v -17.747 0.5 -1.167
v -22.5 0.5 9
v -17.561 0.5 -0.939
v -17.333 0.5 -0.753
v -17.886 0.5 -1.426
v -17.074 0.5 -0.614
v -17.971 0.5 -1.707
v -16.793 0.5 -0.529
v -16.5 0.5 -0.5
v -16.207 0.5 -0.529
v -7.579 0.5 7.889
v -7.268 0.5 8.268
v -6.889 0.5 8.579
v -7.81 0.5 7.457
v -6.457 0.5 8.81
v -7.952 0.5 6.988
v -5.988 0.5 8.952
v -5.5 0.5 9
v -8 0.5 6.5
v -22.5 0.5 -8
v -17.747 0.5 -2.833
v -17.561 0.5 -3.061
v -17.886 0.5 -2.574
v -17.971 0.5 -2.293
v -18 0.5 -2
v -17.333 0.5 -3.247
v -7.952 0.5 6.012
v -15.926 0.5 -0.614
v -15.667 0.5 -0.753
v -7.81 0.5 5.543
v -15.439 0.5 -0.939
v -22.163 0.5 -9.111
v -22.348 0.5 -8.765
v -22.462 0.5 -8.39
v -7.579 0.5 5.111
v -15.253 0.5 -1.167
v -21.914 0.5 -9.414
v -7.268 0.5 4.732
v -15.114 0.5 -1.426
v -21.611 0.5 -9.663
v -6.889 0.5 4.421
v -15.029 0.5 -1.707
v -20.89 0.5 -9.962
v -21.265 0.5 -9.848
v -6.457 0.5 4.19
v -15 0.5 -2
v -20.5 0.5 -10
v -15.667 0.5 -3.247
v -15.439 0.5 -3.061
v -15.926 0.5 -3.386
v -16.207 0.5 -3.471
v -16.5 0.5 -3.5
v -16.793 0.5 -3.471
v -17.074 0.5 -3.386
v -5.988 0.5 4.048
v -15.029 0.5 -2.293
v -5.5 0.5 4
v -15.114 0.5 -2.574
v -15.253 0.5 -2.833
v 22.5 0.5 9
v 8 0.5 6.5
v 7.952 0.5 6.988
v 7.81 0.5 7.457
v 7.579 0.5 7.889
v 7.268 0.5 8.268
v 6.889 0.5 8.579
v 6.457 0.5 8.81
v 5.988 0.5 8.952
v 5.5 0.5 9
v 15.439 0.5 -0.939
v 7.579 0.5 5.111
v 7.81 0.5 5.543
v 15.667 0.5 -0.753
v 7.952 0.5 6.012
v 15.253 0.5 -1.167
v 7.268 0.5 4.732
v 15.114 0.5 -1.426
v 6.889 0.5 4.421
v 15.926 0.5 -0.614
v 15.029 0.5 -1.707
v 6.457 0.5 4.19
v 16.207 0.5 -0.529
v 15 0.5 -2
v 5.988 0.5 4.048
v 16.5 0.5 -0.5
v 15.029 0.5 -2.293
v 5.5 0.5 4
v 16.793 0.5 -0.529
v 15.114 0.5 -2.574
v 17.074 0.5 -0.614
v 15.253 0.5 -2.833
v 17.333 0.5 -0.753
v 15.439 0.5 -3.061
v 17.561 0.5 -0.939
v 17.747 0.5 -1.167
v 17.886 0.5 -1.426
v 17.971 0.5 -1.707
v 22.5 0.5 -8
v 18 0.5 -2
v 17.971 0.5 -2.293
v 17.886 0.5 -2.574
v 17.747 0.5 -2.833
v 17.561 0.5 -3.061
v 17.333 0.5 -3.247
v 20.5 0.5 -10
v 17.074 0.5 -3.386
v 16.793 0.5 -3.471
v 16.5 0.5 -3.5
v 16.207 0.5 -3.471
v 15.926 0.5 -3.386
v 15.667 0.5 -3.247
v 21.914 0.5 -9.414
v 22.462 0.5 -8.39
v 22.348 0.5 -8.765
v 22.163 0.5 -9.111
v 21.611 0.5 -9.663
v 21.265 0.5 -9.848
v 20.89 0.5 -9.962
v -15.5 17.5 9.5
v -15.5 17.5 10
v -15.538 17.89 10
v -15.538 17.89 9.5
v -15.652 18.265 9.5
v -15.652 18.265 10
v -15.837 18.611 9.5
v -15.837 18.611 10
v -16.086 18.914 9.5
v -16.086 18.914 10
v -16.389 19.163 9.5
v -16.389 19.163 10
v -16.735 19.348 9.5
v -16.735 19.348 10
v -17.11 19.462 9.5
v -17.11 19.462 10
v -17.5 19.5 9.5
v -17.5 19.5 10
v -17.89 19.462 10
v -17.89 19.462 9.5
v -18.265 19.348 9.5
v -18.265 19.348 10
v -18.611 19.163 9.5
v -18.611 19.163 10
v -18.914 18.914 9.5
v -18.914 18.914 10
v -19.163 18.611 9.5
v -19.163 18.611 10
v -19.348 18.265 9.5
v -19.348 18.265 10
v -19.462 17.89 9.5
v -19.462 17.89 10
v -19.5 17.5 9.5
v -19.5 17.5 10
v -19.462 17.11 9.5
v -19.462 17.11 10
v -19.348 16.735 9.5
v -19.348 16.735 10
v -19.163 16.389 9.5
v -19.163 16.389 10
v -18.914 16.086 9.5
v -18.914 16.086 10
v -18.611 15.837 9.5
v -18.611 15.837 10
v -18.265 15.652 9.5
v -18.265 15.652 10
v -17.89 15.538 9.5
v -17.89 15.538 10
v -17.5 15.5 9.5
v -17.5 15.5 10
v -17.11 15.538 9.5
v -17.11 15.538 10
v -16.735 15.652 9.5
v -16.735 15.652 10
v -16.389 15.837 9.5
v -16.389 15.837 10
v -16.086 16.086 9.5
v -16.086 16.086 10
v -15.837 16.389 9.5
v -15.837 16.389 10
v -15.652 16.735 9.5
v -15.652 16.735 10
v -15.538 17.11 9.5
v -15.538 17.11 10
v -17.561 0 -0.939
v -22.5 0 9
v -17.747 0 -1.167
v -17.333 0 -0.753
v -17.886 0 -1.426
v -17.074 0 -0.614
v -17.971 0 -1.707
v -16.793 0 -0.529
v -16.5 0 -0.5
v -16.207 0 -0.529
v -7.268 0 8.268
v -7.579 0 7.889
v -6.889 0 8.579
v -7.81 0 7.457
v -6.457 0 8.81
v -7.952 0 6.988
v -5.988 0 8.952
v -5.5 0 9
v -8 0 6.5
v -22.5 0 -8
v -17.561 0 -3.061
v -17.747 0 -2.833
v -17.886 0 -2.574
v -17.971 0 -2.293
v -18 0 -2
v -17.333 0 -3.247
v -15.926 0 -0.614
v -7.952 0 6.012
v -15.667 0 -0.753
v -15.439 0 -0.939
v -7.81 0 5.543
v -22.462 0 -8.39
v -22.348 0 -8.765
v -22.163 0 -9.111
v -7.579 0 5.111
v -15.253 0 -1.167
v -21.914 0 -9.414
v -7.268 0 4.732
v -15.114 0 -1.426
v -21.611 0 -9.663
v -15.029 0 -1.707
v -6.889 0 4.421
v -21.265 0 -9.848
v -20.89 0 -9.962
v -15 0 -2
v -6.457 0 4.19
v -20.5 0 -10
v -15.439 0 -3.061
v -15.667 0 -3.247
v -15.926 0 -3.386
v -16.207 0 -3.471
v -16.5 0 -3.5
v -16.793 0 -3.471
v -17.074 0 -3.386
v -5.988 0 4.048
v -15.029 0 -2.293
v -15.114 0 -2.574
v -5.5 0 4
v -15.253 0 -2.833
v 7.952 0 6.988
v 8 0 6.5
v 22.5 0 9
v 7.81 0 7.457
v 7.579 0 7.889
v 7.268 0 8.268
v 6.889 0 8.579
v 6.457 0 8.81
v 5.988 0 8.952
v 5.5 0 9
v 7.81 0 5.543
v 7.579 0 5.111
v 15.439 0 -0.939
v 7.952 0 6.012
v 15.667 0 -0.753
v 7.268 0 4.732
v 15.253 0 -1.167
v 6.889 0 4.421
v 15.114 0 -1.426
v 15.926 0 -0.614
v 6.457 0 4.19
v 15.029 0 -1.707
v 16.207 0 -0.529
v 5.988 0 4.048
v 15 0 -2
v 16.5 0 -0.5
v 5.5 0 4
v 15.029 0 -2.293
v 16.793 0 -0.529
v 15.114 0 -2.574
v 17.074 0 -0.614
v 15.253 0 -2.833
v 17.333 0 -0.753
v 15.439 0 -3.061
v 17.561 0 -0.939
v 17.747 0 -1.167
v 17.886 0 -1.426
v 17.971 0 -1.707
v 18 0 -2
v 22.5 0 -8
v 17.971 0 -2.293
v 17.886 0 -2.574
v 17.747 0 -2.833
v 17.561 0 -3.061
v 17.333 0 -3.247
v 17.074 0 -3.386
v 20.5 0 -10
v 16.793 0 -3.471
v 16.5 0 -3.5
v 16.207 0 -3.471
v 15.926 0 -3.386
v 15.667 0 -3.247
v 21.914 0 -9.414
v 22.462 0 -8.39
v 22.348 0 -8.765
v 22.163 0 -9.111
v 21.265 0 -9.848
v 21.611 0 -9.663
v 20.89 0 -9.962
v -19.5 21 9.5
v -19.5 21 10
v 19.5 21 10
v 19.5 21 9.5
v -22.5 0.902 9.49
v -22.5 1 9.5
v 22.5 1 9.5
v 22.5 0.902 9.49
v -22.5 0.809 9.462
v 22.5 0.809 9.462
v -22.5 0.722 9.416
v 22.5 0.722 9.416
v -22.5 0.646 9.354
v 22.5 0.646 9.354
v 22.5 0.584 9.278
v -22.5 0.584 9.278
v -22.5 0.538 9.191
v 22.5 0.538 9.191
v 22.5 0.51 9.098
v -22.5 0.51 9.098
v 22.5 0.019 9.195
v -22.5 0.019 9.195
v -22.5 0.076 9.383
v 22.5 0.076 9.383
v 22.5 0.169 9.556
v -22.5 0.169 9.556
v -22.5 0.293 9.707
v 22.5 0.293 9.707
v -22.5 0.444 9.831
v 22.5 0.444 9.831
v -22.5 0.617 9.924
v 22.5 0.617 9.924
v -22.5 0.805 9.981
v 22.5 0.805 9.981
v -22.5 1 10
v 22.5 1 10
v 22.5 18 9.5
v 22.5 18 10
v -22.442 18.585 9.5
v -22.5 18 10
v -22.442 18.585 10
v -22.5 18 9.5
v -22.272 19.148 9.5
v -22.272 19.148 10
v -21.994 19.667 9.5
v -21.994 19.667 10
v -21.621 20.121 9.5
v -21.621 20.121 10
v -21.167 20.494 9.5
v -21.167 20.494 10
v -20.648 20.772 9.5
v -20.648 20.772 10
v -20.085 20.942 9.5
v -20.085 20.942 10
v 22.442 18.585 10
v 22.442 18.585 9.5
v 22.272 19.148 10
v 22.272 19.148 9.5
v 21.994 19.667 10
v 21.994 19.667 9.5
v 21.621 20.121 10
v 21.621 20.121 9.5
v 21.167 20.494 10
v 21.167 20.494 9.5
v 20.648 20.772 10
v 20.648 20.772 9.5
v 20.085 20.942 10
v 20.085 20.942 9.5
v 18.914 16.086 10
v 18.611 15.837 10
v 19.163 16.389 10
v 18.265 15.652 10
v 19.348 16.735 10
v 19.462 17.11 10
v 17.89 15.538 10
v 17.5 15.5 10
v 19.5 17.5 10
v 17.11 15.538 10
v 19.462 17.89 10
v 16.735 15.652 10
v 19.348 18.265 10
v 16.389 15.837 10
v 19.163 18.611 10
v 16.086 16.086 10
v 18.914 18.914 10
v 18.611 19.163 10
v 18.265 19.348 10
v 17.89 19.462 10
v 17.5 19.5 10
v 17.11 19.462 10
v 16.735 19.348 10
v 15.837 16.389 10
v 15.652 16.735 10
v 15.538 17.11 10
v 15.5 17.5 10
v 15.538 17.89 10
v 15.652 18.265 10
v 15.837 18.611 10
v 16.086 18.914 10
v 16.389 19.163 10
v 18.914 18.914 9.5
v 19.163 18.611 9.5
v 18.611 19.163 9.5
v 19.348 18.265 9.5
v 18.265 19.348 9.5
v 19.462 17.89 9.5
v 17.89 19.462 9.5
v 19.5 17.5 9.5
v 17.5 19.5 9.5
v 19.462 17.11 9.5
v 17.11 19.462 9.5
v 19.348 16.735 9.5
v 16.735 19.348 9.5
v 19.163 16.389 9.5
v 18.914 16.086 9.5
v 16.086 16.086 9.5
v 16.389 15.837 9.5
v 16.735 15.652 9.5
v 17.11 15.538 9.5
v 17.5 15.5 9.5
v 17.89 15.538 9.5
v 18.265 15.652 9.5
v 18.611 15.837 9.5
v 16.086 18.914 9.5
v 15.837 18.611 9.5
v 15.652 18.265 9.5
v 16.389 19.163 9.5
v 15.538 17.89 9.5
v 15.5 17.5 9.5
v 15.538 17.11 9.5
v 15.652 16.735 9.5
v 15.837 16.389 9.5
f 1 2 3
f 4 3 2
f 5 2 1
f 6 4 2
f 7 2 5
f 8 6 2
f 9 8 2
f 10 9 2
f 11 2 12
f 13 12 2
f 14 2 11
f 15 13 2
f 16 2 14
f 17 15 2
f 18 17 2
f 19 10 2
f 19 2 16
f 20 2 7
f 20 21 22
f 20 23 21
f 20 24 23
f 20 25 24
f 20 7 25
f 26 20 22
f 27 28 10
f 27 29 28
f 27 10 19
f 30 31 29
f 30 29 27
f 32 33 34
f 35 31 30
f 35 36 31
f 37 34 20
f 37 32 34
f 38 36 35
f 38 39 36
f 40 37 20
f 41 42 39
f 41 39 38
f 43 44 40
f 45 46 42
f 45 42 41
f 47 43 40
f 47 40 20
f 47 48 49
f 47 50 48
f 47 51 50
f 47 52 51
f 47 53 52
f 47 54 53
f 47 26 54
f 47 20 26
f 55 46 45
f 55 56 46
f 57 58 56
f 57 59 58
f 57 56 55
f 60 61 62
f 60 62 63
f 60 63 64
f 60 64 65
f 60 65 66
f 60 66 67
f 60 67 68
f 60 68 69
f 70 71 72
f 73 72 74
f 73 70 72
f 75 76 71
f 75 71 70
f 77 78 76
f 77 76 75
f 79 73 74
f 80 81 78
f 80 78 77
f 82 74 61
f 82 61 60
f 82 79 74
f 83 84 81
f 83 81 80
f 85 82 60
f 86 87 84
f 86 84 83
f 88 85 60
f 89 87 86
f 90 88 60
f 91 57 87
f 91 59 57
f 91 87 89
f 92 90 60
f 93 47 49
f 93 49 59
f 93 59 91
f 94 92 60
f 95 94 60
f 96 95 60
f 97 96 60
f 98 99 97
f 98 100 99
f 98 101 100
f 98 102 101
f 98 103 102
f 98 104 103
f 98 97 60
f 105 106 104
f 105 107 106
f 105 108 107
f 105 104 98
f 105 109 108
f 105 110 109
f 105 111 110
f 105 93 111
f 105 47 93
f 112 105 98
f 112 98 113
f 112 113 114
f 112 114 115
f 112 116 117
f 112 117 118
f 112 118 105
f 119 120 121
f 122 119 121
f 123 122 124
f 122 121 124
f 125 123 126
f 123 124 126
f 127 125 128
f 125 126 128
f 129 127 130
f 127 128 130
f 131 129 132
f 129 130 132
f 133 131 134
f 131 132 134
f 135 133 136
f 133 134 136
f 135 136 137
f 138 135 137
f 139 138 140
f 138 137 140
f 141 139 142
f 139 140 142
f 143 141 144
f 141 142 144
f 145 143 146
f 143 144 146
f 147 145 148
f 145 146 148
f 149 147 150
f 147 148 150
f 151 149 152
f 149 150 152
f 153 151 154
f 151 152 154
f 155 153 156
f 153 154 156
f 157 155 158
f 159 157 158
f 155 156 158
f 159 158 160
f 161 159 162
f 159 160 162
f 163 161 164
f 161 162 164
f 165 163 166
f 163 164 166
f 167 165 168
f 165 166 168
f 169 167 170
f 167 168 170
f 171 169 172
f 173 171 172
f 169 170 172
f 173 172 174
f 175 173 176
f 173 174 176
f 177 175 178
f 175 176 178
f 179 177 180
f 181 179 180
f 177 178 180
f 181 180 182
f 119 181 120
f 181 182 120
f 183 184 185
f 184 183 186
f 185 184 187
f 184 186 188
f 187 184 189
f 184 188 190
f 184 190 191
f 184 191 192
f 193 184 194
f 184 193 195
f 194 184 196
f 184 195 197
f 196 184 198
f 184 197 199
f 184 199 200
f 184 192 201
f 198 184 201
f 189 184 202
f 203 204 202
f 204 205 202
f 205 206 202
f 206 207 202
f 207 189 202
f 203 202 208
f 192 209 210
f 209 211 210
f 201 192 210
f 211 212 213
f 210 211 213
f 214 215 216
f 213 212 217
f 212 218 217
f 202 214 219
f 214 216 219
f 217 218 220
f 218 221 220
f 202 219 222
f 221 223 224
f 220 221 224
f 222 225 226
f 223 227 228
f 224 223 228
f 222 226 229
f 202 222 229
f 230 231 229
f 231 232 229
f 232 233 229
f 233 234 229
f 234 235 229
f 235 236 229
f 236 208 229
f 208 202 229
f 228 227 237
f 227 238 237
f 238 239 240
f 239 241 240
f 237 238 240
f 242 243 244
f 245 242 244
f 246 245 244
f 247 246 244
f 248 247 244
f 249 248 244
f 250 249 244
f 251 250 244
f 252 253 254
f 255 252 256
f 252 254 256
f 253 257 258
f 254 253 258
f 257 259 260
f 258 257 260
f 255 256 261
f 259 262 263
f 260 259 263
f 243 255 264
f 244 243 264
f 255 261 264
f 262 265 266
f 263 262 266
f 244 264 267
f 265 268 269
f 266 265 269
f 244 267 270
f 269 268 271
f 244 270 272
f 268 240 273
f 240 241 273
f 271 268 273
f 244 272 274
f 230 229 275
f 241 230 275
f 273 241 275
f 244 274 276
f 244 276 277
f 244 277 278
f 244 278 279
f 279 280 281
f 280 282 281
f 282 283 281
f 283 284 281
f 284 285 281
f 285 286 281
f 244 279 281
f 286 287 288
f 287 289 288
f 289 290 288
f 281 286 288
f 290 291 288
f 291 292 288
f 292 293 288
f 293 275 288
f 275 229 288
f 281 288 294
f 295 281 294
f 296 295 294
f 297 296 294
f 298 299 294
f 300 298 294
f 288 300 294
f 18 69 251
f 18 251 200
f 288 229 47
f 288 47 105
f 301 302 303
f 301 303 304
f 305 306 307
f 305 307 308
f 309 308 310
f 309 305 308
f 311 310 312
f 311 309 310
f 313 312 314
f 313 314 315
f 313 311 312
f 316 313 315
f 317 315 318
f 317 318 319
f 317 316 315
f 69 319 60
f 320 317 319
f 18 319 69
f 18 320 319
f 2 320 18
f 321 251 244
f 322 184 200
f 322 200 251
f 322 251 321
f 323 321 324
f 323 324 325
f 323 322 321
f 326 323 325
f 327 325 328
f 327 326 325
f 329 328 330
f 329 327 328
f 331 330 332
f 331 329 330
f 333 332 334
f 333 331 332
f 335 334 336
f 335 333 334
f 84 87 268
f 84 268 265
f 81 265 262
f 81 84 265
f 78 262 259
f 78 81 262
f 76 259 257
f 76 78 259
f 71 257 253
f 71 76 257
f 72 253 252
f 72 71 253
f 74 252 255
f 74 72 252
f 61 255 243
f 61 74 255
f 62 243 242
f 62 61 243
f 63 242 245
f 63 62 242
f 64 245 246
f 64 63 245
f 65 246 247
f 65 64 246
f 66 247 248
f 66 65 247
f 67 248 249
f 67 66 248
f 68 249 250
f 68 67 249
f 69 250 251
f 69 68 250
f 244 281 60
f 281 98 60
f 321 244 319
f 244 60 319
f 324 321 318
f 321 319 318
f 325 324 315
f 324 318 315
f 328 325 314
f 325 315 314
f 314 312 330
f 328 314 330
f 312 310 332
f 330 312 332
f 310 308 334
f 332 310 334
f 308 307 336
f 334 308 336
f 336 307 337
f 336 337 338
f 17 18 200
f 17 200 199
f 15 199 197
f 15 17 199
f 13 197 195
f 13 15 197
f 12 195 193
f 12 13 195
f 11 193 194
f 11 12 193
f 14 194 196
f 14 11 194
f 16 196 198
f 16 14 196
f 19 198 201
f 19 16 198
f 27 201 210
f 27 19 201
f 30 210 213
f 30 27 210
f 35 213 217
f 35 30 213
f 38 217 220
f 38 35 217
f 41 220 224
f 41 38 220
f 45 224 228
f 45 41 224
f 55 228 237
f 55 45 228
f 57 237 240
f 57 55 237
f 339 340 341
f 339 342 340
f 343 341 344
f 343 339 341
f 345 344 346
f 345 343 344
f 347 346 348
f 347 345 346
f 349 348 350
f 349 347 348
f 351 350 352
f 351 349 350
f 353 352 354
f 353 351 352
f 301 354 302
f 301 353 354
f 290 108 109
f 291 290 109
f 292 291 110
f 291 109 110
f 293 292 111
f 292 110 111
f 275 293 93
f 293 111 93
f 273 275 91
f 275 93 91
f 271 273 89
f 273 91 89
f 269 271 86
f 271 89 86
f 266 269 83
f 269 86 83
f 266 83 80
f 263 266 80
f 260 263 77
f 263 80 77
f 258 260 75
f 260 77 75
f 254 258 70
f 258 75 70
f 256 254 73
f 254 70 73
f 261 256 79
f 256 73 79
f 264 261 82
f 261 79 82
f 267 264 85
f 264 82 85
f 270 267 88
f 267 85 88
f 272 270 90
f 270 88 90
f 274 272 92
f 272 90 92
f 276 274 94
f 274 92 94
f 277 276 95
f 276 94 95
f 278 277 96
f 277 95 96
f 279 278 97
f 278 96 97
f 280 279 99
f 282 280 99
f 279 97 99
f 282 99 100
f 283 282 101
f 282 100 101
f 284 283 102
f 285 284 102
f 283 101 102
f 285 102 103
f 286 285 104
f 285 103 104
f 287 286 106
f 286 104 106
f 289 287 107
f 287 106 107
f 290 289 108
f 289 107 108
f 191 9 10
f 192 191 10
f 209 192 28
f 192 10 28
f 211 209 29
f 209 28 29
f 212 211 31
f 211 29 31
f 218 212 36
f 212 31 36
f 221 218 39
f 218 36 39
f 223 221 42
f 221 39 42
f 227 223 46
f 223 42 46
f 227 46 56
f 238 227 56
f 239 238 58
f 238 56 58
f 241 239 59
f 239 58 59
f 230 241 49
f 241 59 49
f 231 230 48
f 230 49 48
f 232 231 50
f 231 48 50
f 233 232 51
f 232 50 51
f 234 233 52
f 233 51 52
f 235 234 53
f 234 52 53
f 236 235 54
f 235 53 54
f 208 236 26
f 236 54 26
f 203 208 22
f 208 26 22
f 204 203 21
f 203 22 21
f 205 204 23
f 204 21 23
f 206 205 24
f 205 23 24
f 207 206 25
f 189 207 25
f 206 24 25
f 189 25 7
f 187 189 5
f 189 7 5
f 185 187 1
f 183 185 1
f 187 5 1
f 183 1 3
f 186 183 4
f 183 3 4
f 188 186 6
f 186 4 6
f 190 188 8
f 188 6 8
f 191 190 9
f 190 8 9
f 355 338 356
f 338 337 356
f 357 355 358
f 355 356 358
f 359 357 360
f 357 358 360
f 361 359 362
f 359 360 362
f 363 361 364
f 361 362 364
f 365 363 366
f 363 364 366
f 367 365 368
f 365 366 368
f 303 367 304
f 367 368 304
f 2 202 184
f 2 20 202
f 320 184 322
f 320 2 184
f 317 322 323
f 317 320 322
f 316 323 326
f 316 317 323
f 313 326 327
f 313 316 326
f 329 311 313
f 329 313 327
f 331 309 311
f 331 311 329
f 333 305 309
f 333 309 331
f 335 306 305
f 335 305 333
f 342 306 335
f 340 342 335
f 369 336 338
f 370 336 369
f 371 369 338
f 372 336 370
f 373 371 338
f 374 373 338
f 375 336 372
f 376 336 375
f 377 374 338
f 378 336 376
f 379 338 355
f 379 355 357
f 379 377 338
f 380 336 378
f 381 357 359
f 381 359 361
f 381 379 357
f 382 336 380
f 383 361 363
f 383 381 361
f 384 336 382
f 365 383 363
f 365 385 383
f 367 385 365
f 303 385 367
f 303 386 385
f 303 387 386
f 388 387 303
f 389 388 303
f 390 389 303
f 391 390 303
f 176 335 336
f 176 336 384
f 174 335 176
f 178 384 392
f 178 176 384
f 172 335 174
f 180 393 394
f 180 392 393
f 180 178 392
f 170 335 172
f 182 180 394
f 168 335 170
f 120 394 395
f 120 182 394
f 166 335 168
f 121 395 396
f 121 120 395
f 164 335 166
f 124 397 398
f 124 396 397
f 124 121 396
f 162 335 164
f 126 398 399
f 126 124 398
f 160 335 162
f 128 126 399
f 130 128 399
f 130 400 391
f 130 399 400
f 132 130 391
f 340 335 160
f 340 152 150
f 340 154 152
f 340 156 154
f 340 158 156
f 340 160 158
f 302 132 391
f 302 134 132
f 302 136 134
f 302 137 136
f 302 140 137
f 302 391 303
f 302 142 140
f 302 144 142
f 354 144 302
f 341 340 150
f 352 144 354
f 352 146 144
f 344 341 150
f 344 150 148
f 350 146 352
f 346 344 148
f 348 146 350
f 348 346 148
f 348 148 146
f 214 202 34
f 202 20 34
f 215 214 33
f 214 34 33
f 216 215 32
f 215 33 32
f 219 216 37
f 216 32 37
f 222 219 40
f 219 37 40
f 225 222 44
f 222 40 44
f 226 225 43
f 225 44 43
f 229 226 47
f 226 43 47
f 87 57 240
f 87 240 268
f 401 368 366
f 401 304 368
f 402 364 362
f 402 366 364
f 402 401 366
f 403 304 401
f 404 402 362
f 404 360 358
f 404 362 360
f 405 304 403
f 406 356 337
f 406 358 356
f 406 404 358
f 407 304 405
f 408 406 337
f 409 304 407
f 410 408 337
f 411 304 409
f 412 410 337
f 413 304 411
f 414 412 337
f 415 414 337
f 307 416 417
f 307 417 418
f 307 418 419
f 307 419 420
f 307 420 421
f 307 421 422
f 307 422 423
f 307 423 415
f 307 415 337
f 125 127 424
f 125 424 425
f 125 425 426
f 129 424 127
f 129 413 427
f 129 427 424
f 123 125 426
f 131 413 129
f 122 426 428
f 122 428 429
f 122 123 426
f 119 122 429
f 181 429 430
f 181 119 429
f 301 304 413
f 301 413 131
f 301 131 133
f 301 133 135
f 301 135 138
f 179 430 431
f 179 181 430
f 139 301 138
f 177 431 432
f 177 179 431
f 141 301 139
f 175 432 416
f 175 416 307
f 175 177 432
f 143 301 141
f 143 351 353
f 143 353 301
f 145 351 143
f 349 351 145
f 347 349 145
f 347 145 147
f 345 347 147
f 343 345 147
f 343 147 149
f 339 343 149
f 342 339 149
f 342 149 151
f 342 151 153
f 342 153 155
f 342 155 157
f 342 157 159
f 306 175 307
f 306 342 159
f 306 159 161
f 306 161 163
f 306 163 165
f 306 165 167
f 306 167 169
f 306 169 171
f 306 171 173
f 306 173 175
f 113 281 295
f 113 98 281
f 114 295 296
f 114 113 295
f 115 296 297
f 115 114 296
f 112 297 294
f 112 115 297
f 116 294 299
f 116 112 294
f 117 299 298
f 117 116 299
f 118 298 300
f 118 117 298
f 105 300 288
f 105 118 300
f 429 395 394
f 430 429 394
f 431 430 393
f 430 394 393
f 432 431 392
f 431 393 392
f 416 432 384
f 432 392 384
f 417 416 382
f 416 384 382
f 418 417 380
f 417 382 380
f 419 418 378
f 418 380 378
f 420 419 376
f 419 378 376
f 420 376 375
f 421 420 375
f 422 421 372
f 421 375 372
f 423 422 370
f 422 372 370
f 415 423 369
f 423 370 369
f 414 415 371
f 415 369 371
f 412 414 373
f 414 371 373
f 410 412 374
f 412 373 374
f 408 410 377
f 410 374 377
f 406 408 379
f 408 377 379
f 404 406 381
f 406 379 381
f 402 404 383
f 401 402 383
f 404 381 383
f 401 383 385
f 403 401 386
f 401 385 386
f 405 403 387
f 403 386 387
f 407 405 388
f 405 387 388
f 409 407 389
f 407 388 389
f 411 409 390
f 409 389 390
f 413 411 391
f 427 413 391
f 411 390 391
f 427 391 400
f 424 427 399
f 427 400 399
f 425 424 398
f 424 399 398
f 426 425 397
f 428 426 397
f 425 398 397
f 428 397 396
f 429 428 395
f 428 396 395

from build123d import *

# Parameters (mm, degrees)
SKETCH_1_W                       = 45
SKETCH_1_H                       = 20
EXTRUDE_1_DEPTH                  = 0.5
SM_EDGE_FLANGE_1_STRIP_W         = 3
SM_EDGE_FLANGE_1_STRIP_H         = 0.5
SM_EDGE_FLANGE_1_STRIP_CUT_DEPTH = 45
SM_EDGE_FLANGE_1_DEPTH           = 45
SKETCH_9_R                       = 2
CUT_EXTRUDE_1_DEPTH              = 0.5
CUT_EXTRUDE_2_DEPTH              = 0.5
SKETCH_11_R                      = 1.5
CUT_EXTRUDE_3_DEPTH              = 0.5
FILLET_1_R                       = 3
FILLET_2_R                       = 2


# Sheet-metal steps are written as plain solids
with BuildPart() as part:
    # Sketch 1 → Бобышка-Вытянуть1 (new body)
    with BuildSketch(Plane(origin=(0, 0, 0), x_dir=(1, 0, 0), z_dir=(0, 1, 0))):
        Rectangle(SKETCH_1_W, SKETCH_1_H)
    extrude(amount=EXTRUDE_1_DEPTH)

    # Ребро-кромка1 strip (across the edge) → Ребро-кромка1 strip cut (cut)
    with BuildSketch(Plane(origin=(-22.5, 0.5, 10), x_dir=(0, 0, -1), z_dir=(1, 0, 0))):
        with Locations((-0.5, -0.25)):
            Rectangle(SM_EDGE_FLANGE_1_STRIP_W, SM_EDGE_FLANGE_1_STRIP_H)
    extrude(amount=SM_EDGE_FLANGE_1_STRIP_CUT_DEPTH, mode=Mode.SUBTRACT)

    # Ребро-кромка1 section (across the edge) → Ребро-кромка1 (add)
    with BuildSketch(Plane(origin=(-22.5, 0.5, 10), x_dir=(0, 0, -1), z_dir=(1, 0, 0))):
        with BuildLine():
            Line((0, 0.5), (0, 20.5))
            Line((0, 20.5), (0.5, 20.5))
            Line((0.5, 20.5), (0.5, 0.5))
            ThreePointArc((0.5, 0.5), (0.646446609, 0.146446609), (1, 0))
            Line((1, 0), (1, -0.5))
            ThreePointArc((1, -0.5), (0.292893219, -0.207106781), (0, 0.5))
        make_face()
    extrude(amount=SM_EDGE_FLANGE_1_DEPTH)

    # Эскиз9 → Вырез-Вытянуть1 (cut)
    with BuildSketch(Plane.XY.offset(10)):
        with Locations((-17.5, 17.5)):
            Circle(SKETCH_9_R)
        with Locations(Location((17.5, 17.5, 0), (0, 0, 180))):
            Circle(SKETCH_9_R)
    extrude(amount=-CUT_EXTRUDE_1_DEPTH, mode=Mode.SUBTRACT)

    # Эскиз10 → Вырез-Вытянуть2 (cut)
    with BuildSketch(Plane(origin=(0, 0.5, 0), x_dir=(1, 0, 0), z_dir=(0, 1, 0))):
        with BuildLine():
            Line((-5.5, -4), (5.5, -4))
            ThreePointArc((5.5, -4), (8, -6.5), (5.5, -9))
            Line((5.5, -9), (-5.5, -9))
            ThreePointArc((-5.5, -9), (-8, -6.5), (-5.5, -4))
        make_face()
    extrude(amount=-CUT_EXTRUDE_2_DEPTH, mode=Mode.SUBTRACT)

    # Эскиз11 → Вырез-Вытянуть3 (cut)
    with BuildSketch(Plane(origin=(0, 0.5, 0), x_dir=(1, 0, 0), z_dir=(0, 1, 0))):
        with Locations(Location((-16.5, 2, 0), (0, 0, 270))):
            Circle(SKETCH_11_R)
        with Locations(Location((16.5, 2, 0), (0, 0, 90))):
            Circle(SKETCH_11_R)
    extrude(amount=-CUT_EXTRUDE_3_DEPTH, mode=Mode.SUBTRACT)

    # Скругление1
    fillet_1_edges = [part.edges().sort_by_distance(p)[0] for p in [
        (-22.5, 21, 9.75),
        (22.5, 21, 9.75),
    ]]
    fillet(fillet_1_edges, radius=FILLET_1_R)

    # Скругление2
    fillet_2_edges = [part.edges().sort_by_distance(p)[0] for p in [
        (22.5, 0.25, -10),
        (-22.5, 0.25, -10),
    ]]
    fillet(fillet_2_edges, radius=FILLET_2_R)


solid = part.part
